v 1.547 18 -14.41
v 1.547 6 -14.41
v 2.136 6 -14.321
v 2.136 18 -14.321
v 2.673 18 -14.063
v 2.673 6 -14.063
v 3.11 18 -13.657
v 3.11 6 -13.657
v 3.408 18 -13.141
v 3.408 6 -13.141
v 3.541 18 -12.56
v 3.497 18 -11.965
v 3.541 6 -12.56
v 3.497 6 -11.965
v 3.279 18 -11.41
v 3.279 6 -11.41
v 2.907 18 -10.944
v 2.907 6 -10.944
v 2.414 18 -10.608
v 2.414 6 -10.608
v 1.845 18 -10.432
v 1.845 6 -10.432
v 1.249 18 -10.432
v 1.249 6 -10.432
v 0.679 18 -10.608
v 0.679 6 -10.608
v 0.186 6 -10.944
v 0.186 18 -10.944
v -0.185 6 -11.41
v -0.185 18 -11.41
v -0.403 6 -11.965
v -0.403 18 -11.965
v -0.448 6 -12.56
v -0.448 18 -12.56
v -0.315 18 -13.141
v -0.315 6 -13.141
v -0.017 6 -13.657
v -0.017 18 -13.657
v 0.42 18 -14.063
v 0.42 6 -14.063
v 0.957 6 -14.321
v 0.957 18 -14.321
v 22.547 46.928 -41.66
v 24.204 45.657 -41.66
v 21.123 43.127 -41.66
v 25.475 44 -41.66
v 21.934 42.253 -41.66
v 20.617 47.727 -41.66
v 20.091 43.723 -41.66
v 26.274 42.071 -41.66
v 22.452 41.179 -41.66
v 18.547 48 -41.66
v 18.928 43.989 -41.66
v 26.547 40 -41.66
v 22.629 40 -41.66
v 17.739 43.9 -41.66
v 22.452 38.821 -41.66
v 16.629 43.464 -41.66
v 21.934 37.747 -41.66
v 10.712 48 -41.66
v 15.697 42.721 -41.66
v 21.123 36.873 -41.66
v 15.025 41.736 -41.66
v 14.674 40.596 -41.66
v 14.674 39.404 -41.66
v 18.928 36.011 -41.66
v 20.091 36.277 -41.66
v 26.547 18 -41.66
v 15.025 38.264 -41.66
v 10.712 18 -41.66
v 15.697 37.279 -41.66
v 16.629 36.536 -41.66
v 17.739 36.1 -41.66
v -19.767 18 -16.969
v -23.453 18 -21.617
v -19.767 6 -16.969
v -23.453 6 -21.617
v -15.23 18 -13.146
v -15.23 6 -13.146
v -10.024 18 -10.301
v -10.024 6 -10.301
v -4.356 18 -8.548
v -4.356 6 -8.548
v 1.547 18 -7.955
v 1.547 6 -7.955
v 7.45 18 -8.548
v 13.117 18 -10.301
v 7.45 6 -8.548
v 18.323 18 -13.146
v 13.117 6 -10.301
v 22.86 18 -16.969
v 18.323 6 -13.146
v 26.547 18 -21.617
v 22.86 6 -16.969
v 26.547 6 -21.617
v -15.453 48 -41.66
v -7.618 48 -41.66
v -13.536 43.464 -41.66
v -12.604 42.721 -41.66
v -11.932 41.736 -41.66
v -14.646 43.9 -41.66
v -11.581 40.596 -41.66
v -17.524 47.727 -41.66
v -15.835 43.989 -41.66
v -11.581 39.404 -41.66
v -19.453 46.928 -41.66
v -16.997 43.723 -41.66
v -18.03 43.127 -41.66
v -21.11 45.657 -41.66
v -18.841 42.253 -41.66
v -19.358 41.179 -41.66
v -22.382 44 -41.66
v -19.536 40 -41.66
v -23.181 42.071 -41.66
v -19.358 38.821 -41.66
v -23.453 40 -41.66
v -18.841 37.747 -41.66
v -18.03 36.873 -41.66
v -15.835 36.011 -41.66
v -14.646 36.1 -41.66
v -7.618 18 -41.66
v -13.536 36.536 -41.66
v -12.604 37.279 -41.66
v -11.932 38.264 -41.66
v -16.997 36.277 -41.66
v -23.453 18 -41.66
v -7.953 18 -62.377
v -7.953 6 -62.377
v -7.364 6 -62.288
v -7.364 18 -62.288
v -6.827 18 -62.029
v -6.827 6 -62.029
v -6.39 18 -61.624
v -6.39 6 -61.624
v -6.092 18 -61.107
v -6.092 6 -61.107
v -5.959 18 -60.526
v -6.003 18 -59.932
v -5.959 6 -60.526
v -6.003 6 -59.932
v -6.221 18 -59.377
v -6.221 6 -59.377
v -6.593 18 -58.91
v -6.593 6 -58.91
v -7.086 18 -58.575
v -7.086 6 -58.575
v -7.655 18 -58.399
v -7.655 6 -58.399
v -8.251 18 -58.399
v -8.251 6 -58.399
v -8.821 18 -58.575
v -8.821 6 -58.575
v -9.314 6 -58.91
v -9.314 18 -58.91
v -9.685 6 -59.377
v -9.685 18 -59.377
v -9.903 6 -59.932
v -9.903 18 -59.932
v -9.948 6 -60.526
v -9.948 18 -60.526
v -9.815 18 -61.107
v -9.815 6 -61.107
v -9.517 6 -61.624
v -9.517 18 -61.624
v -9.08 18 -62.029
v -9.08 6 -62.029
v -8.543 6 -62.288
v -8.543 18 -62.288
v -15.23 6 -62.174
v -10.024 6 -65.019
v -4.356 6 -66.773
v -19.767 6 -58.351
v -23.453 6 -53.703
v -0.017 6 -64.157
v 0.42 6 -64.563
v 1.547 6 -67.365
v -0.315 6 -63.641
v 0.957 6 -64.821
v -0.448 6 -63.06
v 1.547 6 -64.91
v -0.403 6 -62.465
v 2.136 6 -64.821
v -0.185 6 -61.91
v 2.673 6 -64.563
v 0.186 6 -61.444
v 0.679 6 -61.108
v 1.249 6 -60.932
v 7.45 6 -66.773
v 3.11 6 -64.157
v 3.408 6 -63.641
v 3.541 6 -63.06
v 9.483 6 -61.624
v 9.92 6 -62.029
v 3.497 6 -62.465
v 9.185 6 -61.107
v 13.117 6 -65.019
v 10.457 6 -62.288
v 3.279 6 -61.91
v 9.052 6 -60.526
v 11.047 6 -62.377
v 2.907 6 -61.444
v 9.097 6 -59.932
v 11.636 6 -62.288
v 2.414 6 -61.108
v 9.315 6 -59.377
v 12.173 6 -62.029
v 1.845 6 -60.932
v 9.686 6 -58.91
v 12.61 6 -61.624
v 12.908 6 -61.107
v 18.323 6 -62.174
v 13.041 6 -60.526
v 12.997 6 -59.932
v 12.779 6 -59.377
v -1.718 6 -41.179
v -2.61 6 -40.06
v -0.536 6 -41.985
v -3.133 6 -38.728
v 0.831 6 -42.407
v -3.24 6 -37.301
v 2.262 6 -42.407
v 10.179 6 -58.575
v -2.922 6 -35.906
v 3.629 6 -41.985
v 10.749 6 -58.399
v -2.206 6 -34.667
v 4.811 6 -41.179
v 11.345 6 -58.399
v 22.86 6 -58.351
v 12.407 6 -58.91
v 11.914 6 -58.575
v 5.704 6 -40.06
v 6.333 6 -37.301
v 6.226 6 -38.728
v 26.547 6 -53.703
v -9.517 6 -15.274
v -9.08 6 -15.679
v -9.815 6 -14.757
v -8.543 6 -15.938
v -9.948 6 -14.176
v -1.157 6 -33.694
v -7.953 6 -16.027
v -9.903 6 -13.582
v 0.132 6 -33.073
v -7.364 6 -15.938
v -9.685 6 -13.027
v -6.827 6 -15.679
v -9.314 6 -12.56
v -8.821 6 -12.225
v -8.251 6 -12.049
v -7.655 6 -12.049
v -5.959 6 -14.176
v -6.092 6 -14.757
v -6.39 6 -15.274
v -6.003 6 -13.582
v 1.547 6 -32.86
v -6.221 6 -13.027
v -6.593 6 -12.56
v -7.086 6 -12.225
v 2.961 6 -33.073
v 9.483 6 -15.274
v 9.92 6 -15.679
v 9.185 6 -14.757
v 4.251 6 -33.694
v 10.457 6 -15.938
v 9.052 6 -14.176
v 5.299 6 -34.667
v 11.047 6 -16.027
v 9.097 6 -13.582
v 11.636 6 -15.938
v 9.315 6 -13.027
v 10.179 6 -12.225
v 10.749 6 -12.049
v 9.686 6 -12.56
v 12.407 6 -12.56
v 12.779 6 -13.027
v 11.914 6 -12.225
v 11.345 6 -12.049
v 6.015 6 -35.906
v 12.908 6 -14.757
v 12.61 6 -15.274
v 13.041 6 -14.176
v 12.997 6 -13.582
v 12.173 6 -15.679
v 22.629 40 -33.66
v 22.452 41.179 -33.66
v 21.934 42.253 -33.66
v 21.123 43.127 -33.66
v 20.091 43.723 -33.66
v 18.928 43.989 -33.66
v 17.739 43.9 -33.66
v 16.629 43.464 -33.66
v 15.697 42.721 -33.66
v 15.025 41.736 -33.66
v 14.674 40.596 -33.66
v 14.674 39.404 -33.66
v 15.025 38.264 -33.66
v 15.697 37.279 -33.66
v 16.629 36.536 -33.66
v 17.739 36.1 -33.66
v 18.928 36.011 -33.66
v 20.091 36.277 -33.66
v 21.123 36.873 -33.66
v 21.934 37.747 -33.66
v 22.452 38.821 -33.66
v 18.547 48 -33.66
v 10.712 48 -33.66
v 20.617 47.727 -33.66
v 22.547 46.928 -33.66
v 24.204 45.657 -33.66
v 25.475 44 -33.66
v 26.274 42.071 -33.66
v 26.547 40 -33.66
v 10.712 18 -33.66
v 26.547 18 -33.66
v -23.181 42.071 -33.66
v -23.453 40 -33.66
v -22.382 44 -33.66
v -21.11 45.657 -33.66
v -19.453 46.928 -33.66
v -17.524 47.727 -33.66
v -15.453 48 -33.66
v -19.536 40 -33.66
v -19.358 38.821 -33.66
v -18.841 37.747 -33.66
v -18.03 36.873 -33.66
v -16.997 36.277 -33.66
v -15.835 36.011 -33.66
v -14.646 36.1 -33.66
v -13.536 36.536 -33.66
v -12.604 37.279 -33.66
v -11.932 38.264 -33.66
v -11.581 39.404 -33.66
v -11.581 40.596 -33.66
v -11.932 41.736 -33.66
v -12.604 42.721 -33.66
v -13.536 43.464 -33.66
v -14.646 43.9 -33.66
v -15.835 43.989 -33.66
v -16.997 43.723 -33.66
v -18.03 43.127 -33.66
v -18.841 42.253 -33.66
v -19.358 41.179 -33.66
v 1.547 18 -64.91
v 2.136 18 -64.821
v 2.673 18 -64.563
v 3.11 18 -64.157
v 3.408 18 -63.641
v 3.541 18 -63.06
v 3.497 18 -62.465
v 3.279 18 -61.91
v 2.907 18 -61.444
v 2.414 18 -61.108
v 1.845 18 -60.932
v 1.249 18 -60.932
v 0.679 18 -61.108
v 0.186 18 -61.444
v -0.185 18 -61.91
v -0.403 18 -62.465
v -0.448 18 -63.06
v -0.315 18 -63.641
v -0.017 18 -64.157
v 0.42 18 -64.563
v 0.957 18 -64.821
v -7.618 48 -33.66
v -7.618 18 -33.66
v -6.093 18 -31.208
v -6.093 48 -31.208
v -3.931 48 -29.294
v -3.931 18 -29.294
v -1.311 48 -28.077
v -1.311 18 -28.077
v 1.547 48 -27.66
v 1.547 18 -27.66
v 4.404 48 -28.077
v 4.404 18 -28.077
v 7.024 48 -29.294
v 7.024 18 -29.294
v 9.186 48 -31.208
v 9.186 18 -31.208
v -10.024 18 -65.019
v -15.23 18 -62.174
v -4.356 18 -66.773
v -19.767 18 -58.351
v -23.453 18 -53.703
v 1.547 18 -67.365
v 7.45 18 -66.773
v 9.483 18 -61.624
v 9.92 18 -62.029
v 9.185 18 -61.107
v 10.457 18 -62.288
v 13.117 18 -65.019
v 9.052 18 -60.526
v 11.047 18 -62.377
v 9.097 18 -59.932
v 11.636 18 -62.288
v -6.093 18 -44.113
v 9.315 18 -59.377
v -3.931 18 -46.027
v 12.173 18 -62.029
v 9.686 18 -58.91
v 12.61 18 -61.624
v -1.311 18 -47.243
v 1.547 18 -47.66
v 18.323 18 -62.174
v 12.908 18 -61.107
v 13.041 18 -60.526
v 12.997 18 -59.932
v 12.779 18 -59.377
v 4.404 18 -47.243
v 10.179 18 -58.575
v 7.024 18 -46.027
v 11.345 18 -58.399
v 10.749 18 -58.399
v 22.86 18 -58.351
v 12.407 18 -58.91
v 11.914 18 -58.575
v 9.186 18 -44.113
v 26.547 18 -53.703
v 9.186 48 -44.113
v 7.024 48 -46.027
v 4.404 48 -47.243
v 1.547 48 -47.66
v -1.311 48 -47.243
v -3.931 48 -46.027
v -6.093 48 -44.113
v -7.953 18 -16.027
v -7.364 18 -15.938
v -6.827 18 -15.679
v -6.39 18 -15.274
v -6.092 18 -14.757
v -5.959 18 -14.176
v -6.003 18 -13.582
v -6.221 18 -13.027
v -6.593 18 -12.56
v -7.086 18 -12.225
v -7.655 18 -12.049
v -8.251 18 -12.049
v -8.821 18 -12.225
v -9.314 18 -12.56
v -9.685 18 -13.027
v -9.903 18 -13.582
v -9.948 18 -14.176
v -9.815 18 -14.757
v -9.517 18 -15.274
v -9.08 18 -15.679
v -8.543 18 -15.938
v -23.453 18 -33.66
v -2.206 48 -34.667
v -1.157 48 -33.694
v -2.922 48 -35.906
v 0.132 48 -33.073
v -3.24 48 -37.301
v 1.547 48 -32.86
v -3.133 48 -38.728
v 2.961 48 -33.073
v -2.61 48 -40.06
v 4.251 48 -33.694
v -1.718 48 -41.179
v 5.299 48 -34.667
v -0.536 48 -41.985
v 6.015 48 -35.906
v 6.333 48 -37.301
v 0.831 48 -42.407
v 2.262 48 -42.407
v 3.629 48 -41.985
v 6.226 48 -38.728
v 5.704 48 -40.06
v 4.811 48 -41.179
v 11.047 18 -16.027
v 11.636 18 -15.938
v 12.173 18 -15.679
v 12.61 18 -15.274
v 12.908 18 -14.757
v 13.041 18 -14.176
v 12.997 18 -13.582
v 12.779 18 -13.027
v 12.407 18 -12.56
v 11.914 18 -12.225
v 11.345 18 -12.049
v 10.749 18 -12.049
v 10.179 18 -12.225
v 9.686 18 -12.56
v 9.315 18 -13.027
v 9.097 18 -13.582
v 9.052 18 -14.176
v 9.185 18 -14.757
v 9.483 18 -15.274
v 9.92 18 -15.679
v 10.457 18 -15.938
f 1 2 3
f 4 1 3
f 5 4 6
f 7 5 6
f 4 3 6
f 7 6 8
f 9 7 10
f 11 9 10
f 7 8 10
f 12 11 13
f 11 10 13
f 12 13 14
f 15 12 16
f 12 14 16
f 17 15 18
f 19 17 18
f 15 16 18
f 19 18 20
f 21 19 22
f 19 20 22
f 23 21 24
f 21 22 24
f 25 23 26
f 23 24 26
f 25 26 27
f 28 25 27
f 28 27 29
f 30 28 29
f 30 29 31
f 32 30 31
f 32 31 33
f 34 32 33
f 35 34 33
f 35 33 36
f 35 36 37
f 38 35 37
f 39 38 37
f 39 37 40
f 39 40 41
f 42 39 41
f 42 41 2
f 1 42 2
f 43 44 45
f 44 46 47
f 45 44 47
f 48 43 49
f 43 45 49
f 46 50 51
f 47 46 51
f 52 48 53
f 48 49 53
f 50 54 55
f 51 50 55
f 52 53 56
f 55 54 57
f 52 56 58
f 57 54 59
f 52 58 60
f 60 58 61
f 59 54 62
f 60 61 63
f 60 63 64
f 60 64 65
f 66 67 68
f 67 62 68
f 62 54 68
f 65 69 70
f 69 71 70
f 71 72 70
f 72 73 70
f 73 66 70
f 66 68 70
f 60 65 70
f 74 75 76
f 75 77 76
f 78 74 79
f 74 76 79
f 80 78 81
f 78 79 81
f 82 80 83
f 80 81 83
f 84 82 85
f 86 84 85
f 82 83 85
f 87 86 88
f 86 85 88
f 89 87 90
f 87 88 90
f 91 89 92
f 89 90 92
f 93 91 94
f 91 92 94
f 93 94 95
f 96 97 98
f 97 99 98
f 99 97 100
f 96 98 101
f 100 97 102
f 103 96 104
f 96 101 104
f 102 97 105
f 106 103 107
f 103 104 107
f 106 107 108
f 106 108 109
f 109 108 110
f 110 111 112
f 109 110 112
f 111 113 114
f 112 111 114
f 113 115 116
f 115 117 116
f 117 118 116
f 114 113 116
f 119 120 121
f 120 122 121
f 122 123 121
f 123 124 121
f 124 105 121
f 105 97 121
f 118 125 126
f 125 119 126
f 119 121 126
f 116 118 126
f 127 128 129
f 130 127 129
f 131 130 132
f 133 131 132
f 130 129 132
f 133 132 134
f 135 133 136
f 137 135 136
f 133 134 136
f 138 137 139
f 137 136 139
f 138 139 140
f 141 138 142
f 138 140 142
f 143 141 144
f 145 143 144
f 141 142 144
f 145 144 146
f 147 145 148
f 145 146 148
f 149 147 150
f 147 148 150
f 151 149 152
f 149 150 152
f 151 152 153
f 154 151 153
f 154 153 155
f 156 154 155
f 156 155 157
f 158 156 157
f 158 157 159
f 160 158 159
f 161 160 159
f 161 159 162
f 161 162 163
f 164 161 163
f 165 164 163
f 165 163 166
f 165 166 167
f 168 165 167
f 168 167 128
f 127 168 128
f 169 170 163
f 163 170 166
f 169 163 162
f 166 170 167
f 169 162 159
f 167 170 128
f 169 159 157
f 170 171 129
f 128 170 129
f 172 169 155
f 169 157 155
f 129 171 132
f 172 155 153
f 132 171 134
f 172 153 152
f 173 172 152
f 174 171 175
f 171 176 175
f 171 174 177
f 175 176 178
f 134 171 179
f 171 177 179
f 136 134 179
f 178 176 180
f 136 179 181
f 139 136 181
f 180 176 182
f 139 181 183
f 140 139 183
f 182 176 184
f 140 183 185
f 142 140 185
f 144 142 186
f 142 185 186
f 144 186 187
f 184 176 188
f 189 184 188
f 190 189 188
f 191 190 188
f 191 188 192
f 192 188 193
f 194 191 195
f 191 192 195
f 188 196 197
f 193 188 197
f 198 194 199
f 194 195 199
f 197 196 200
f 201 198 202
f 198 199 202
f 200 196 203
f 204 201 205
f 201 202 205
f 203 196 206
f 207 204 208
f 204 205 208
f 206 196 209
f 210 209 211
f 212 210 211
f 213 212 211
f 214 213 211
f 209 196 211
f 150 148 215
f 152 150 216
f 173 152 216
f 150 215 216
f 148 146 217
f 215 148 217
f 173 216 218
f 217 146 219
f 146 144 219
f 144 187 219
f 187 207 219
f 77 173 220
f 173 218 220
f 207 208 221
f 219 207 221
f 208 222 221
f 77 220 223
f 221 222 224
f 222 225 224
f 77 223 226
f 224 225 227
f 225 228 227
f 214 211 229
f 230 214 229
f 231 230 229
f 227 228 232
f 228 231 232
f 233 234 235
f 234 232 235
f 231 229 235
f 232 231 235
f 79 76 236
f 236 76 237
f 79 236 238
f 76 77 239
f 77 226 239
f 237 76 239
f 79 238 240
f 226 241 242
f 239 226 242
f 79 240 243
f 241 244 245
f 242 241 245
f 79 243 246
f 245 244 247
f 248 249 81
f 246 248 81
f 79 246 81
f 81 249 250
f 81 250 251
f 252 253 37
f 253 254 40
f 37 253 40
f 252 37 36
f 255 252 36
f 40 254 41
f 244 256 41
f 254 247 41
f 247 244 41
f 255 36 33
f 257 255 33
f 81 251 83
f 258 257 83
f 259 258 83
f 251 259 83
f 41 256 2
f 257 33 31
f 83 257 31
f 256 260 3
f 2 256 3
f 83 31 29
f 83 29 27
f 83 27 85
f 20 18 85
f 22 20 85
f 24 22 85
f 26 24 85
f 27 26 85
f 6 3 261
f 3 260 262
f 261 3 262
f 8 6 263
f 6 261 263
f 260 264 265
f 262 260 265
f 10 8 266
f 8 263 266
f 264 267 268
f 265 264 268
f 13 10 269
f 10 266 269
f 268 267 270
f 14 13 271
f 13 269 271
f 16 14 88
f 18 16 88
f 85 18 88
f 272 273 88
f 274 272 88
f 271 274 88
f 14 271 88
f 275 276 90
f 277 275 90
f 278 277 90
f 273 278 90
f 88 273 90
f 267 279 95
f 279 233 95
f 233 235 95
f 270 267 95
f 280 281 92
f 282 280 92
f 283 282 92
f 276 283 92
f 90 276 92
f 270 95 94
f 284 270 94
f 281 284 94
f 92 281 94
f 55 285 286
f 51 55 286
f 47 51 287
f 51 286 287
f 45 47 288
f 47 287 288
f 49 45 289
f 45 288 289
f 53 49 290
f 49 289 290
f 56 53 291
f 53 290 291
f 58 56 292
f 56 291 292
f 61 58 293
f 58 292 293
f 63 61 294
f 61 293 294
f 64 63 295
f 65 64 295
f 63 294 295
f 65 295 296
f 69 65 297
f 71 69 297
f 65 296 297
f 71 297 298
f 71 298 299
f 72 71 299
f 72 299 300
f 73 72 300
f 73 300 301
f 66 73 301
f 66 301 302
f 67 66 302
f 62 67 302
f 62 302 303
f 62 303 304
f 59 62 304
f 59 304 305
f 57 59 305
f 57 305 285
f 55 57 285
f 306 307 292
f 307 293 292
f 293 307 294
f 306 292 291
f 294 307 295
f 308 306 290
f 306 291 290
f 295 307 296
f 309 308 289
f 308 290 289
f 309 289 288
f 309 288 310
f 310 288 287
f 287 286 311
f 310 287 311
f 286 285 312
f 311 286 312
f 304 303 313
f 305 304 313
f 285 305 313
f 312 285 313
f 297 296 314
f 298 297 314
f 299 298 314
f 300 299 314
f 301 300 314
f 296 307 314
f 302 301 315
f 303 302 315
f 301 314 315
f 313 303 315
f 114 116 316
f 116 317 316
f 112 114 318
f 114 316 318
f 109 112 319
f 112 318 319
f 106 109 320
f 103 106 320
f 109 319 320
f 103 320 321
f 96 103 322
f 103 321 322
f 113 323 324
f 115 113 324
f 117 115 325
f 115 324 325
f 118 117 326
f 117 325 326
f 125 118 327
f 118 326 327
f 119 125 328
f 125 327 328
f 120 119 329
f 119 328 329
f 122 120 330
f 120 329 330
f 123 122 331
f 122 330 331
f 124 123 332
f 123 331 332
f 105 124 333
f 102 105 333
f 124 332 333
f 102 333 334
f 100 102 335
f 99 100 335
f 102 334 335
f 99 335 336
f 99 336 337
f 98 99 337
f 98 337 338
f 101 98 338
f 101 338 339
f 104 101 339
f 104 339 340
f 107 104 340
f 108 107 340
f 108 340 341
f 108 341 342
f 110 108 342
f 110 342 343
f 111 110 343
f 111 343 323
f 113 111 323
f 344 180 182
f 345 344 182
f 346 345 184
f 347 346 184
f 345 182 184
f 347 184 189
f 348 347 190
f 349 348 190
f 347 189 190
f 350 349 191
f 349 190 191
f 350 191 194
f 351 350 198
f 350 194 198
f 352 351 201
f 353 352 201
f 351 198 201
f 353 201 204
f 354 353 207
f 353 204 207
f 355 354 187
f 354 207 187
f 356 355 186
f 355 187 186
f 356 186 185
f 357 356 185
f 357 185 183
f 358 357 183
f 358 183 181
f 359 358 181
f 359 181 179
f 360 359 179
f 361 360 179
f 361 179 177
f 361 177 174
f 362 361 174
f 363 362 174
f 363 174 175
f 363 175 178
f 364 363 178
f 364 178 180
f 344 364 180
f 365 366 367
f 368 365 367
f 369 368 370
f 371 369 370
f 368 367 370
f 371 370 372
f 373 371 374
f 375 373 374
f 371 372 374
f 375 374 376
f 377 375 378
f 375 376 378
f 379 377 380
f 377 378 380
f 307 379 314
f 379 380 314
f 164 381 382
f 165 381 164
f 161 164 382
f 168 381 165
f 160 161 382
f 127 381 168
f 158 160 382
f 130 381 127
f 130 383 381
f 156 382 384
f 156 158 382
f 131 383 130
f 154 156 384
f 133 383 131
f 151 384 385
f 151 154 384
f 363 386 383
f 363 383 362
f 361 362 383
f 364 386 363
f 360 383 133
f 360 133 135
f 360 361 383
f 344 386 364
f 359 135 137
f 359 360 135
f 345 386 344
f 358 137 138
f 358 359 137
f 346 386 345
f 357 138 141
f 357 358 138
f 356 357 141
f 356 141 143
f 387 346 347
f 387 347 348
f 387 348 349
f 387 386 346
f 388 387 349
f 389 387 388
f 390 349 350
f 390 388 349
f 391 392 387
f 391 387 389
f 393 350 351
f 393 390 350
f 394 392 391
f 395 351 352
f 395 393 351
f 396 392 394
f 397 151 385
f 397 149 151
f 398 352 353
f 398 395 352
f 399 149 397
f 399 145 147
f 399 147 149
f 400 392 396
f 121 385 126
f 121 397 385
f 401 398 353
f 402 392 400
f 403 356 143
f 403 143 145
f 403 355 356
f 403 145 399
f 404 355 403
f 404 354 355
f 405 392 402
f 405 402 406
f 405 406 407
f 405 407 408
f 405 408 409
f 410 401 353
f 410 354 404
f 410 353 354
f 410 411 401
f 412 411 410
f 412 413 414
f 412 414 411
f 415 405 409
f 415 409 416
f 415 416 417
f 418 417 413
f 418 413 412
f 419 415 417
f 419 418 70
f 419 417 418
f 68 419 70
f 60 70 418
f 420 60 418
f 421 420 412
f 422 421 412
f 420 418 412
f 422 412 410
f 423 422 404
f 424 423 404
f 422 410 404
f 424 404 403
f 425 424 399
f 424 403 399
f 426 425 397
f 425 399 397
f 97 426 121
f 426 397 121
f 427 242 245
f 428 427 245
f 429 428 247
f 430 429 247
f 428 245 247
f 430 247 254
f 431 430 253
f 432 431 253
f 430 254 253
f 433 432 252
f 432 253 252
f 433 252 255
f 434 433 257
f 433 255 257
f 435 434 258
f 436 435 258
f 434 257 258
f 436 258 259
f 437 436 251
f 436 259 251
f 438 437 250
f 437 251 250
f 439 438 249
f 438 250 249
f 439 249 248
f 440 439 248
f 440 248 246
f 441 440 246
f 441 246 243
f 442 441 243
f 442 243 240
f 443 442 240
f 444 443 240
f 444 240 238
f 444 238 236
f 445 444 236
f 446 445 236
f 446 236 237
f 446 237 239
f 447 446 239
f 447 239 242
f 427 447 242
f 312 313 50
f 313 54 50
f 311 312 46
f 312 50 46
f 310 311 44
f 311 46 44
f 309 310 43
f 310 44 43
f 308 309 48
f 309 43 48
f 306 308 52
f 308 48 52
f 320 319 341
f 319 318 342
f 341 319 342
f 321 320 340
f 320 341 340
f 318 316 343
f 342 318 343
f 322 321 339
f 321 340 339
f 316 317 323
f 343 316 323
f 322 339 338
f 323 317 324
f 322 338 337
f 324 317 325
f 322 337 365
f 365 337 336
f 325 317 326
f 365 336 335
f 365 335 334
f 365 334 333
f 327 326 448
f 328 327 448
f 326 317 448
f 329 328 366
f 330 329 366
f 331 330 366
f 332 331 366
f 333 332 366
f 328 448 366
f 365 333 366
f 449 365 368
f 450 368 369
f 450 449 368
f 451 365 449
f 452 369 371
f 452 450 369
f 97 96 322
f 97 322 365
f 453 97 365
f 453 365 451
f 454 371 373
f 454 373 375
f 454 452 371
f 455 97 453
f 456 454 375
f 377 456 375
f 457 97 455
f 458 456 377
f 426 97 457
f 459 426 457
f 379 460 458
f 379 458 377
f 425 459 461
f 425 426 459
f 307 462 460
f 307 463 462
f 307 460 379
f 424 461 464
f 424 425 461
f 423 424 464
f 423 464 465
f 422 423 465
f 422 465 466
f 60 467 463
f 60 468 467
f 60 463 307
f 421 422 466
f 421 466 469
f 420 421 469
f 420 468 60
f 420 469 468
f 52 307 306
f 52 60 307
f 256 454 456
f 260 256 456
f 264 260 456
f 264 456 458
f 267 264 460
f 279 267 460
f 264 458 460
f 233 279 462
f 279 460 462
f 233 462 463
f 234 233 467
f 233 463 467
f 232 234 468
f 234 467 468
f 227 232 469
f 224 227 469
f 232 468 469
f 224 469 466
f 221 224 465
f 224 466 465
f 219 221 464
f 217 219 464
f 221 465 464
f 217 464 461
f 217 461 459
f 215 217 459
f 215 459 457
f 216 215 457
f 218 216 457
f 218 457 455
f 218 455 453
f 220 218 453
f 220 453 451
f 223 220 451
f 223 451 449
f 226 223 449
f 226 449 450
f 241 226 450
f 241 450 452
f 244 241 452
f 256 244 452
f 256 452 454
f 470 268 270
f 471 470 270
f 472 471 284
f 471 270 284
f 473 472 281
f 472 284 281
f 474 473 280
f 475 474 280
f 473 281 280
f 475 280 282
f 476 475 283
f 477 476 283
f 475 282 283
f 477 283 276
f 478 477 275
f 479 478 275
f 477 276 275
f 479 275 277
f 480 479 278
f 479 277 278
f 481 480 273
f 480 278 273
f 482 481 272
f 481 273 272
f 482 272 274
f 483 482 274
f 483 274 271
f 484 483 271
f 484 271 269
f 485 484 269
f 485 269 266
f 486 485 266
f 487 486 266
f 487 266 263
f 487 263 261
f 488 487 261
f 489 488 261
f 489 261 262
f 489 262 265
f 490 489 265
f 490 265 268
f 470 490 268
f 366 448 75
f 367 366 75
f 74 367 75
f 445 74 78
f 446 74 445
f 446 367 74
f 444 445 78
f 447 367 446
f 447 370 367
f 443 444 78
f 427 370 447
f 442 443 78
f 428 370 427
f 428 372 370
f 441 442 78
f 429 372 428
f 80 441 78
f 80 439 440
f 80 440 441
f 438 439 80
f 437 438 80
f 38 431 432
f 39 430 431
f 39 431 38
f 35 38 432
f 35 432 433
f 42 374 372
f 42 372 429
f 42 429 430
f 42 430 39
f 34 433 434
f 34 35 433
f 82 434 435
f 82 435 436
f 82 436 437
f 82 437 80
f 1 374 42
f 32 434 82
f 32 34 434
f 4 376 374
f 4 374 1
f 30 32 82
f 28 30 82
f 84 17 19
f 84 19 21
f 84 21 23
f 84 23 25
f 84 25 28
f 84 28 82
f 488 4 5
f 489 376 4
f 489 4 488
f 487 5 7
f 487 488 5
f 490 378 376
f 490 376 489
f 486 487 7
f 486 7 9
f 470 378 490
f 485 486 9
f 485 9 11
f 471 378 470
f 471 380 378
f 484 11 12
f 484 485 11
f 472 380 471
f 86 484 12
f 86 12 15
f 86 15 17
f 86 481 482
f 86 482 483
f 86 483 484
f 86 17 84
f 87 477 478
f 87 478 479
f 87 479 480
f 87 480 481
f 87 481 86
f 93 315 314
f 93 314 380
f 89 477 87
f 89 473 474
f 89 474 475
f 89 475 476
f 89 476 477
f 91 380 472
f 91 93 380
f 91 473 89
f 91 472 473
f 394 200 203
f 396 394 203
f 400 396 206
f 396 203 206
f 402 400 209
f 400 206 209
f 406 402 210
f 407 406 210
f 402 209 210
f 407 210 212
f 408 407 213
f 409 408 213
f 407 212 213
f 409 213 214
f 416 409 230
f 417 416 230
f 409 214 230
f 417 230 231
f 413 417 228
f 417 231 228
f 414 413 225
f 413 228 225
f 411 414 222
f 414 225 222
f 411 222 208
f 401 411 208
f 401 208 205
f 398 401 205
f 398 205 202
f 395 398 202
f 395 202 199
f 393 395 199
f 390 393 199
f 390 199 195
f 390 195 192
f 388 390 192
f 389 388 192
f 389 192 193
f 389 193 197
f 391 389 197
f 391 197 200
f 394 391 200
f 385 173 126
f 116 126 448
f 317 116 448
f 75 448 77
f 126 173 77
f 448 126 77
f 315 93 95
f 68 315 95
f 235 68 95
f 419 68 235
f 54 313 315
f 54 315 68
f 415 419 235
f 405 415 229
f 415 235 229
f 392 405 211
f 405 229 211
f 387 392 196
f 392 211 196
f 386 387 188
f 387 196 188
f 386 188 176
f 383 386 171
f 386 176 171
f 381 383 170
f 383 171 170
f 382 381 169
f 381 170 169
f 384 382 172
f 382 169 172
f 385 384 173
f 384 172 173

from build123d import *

# Parameters (mm, degrees)
SKETCH1_R            = 29.705
BASE_DEPTH           = 12
SUPPORT_SHAPE_DEPTH  = 30
SKETCH3_R            = 4.8
PEN_HOLE_DEPTH       = 86.315453863
SKETCH5_R            = 2
BOLT_HOLES_DEPTH     = 86.315453863
ELASTIC_HOLES_REACH  = 68.458
SKETCH8_R            = 4
DECORATIVE_FILLET_R  = 8
SKETCH9_W            = 13.029443146
SKETCH9_H            = 56.051778338
SKETCH9_W_2          = 11.207609874
SKETCH9_H_2          = 62.108426406
DECORATIVE_CUT_DEPTH = 81.091988787


with BuildPart() as part:
    # Sketch1 → Base (new body)
    with BuildSketch(Plane(origin=(0, 6, 0), x_dir=(1, 0, 0), z_dir=(0, 1, 0))):
        with Locations(Location((1.546657586, 37.660128709, 0), (0, 0, 270))):
            Circle(SKETCH1_R)
    extrude(amount=BASE_DEPTH)

    # Sketch2 → Support Shape (add)
    with BuildSketch(Plane(origin=(0, 18, 0), x_dir=(1, 0, 0), z_dir=(0, 1, 0))):
        with BuildLine():
            Line((-7.618493804, 41.660128709), (-23.453342414, 41.660128709))
            Line((-23.453342414, 41.660128709), (-23.453342414, 33.660128709))
            Line((-23.453342414, 33.660128709), (-7.618493804, 33.660128709))
            ThreePointArc((-7.618493804, 33.660128709), (-8.453342414, 37.660128709), (-7.618493804, 41.660128709))
        make_face()
        with BuildLine():
            ThreePointArc((10.711808976, 41.660128709), (1.546657586, 47.660128709), (-7.618493804, 41.660128709))
            Line((-7.618493804, 41.660128709), (10.711808976, 41.660128709))
        make_face()
        with BuildLine():
            Line((10.711808976, 41.660128709), (-7.618493804, 41.660128709))
            ThreePointArc((-7.618493804, 41.660128709), (-8.453342414, 37.660128709), (-7.618493804, 33.660128709))
            Line((-7.618493804, 33.660128709), (10.711808976, 33.660128709))
            ThreePointArc((10.711808976, 33.660128709), (11.335720716, 35.617032272), (11.546657586, 37.660128709))
            ThreePointArc((11.546657586, 37.660128709), (11.335720716, 39.703225146), (10.711808976, 41.660128709))
        make_face()
        with BuildLine():
            Line((10.711808976, 33.660128709), (-7.618493804, 33.660128709))
            ThreePointArc((-7.618493804, 33.660128709), (1.546657586, 27.660128709), (10.711808976, 33.660128709))
        make_face()
        with BuildLine():
            Line((26.546657586, 41.660128709), (10.711808976, 41.660128709))
            ThreePointArc((10.711808976, 41.660128709), (11.335720716, 39.703225146), (11.546657586, 37.660128709))
            ThreePointArc((11.546657586, 37.660128709), (11.335720716, 35.617032272), (10.711808976, 33.660128709))
            Line((10.711808976, 33.660128709), (26.546657586, 33.660128709))
            Line((26.546657586, 33.660128709), (26.546657586, 41.660128709))
        make_face()
    extrude(amount=SUPPORT_SHAPE_DEPTH)

    # Sketch3 → Pen Hole (cut, through all)
    with BuildSketch(Plane(origin=(0, 48, 0), x_dir=(1, 0, 0), z_dir=(0, 1, 0))):
        with Locations(Location((1.546657586, 37.660128709, 0), (0, 0, 270))):
            Circle(SKETCH3_R)
    extrude(amount=-PEN_HOLE_DEPTH, mode=Mode.SUBTRACT)

    # Sketch5 → Bolt Holes (cut, through all)
    with BuildSketch(Plane.XZ.offset(-6)):
        with Locations(Location((-7.953342414, -14.026565813, 0), (0, 0, 270))):
            Circle(SKETCH5_R)
        with Locations(Location((1.546657586, -12.410128709, 0), (0, 0, 270))):
            Circle(SKETCH5_R)
        with Locations(Location((11.046657586, -14.026565813, 0), (0, 0, 270))):
            Circle(SKETCH5_R)
        with Locations(Location((11.046657586, -60.376565813, 0), (0, 0, 270))):
            Circle(SKETCH5_R)
        with Locations(Location((1.546657586, -62.910128709, 0), (0, 0, 270))):
            Circle(SKETCH5_R)
        with Locations(Location((-7.953342414, -60.376565813, 0), (0, 0, 270))):
            Circle(SKETCH5_R)
    extrude(amount=-BOLT_HOLES_DEPTH, mode=Mode.SUBTRACT)

    # Sketch8 → Elastic Holes (cut, up to next)
    with BuildSketch(Plane.XY.offset(-33.660128709), mode=Mode.PRIVATE) as elastic_holes_sk1:
        with Locations((18.629233281, 40)):
            Circle(SKETCH8_R)
    elastic_holes_tool1 = extrude(elastic_holes_sk1.sketch, amount=-ELASTIC_HOLES_REACH, mode=Mode.PRIVATE) & part.part
    # Sketch8 → Elastic Holes (cut, up to next)
    with BuildSketch(Plane.XY.offset(-33.660128709), mode=Mode.PRIVATE) as elastic_holes_sk2:
        with Locations(Location((-15.535918109, 40, 0), (0, 0, 180))):
            Circle(SKETCH8_R)
    elastic_holes_tool2 = extrude(elastic_holes_sk2.sketch, amount=-ELASTIC_HOLES_REACH, mode=Mode.PRIVATE) & part.part
    add(elastic_holes_tool1.solids().sort_by_distance((18.629233, 40, -33.660129))[0], mode=Mode.SUBTRACT)
    add(elastic_holes_tool2.solids().sort_by_distance((-15.535918, 40, -33.660129))[0], mode=Mode.SUBTRACT)

    # Decorative Fillet
    decorative_fillet_edges = [part.edges().sort_by_distance(p)[0] for p in [
        (26.546657586, 48, -37.660128709),
        (-23.453342414, 48, -37.660128709),
    ]]
    fillet(decorative_fillet_edges, radius=DECORATIVE_FILLET_R)

    # Sketch9 → Decorative Cut (cut, through all)
    with BuildSketch(Plane(origin=(0, 18, 0), x_dir=(1, 0, 0), z_dir=(0, 1, 0))):
        with Locations((33.061379159, 37.205930485)):
            Rectangle(SKETCH9_W, SKETCH9_H)
        with Locations((-29.057147351, 40.234254519)):
            Rectangle(SKETCH9_W_2, SKETCH9_H_2)
    extrude(amount=-DECORATIVE_CUT_DEPTH, mode=Mode.SUBTRACT)


solid = part.part
